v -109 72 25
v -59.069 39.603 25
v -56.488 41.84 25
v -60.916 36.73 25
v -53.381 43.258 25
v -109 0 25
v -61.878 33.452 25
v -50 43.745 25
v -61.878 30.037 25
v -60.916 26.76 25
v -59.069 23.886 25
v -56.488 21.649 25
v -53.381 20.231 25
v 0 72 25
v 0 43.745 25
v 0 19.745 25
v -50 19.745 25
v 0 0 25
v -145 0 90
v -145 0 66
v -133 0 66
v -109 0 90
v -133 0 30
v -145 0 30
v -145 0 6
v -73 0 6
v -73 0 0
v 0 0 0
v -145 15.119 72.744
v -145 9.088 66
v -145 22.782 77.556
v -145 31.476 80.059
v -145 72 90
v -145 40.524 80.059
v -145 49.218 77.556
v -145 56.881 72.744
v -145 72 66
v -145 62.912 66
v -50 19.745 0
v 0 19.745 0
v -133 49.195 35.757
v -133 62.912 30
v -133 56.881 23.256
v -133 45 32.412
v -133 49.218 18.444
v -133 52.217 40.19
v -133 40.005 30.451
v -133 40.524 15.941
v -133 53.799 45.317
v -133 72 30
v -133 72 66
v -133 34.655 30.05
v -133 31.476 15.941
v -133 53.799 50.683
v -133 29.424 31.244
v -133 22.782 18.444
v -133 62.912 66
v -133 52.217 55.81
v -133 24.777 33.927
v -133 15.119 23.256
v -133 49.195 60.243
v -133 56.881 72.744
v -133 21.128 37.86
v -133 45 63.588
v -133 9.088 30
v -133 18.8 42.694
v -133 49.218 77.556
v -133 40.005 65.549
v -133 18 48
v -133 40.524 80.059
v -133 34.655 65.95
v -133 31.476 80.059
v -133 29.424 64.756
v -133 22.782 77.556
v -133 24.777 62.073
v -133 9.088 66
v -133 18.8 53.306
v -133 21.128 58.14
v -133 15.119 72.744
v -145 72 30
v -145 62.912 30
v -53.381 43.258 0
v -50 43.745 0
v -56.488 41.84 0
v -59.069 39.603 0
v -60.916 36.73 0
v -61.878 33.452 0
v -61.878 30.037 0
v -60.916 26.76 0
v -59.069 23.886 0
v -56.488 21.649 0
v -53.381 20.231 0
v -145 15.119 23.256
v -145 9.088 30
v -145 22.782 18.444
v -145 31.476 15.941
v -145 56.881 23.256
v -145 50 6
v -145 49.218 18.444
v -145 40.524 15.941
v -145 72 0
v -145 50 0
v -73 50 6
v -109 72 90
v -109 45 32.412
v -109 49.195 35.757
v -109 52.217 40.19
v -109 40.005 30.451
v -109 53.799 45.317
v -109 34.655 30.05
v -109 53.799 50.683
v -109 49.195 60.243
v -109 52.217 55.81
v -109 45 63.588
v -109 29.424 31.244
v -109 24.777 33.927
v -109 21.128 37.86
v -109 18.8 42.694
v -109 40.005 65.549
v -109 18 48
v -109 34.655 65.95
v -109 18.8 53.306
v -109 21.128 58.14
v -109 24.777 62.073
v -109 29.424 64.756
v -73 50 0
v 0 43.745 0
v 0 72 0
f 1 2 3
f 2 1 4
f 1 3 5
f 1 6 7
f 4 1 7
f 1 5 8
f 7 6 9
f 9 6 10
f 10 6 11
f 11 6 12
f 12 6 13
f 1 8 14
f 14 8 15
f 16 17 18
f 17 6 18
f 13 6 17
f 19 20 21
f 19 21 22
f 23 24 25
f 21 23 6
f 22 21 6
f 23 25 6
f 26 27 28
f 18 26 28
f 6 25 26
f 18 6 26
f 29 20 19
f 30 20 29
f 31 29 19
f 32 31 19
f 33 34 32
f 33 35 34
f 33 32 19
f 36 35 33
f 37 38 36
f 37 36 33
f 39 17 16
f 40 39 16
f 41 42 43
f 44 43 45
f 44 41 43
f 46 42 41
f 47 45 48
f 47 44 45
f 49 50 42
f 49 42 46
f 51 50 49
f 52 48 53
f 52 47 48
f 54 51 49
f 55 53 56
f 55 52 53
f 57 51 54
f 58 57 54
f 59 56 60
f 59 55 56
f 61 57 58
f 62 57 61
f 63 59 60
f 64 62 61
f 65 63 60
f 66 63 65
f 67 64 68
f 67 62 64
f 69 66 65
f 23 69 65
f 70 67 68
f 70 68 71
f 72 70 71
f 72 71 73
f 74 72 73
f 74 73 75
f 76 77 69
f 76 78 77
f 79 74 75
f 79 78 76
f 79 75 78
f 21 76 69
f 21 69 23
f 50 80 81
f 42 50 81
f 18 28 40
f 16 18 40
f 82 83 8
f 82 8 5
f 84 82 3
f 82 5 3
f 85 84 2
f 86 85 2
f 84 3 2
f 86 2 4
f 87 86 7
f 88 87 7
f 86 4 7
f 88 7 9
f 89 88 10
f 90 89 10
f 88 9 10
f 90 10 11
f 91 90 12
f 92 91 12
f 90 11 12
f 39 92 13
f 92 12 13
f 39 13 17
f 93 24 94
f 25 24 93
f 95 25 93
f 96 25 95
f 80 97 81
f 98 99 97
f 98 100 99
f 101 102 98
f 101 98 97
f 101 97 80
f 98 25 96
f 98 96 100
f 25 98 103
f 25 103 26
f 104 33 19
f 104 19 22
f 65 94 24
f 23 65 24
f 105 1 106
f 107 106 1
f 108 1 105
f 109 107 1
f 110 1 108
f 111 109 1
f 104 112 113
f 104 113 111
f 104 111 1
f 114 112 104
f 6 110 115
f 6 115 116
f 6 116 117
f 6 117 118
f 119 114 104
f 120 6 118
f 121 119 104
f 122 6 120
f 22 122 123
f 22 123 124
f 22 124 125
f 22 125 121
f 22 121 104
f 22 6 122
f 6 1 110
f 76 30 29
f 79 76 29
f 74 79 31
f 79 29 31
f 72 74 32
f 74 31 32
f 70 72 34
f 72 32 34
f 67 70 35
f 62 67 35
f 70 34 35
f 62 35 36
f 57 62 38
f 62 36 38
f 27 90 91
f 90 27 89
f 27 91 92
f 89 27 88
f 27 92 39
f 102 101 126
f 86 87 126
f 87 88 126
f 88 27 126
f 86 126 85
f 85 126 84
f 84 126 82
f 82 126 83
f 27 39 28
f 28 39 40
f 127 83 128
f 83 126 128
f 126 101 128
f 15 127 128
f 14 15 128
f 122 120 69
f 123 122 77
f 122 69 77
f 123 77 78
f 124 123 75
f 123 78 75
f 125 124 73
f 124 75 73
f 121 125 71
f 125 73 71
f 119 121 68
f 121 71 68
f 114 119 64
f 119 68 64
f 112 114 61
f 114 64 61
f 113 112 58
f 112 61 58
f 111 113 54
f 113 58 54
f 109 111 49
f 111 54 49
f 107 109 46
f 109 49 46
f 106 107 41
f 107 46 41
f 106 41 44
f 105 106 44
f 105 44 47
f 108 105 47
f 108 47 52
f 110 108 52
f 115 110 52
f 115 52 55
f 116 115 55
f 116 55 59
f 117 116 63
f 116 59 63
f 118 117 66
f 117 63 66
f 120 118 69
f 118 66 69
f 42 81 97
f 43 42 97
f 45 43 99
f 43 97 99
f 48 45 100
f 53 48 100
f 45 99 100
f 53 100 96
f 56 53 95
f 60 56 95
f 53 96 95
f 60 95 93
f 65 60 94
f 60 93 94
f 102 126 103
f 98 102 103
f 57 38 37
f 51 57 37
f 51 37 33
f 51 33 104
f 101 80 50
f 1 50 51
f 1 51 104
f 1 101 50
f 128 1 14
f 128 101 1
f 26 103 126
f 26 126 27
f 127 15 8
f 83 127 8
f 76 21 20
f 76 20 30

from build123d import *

# Parameters (mm, degrees)
F0_W      = 145
F0_H      = 72
F1_DEPTH  = 90
F2_W      = 109
F2_H      = 65
F3_DEPTH  = 90
F5_DEPTH  = 25.4
F6_W      = 50
F6_H      = 6
F7_DEPTH  = 72
F9_DEPTH  = 12
F10_R     = 18
F11_DEPTH = 24


with BuildPart() as f1:
    # F0 (on Top) → F1 (new body)
    with BuildSketch(Plane.XY):
        with Locations((-72.5, 36)):
            Rectangle(F0_W, F0_H)
    extrude(amount=F1_DEPTH)

    # F2 (on face) → F3 (cut)
    with BuildSketch(Plane.XZ):
        with Locations((-54.5, 57.5)):
            Rectangle(F2_W, F2_H)
    extrude(amount=-F3_DEPTH, mode=Mode.SUBTRACT)

    # F4 (on face) → F5 (cut)
    with BuildSketch(Plane.XY.offset(25)):
        with BuildLine():
            Line((-50, 19.744541496), (0, 19.744541496))
            Line((0, 19.744541496), (0, 43.744541496))
            Line((0, 43.744541496), (-50, 43.744541496))
            ThreePointArc((-50, 43.744541496), (-62, 31.744541496), (-50, 19.744541496))
        make_face()
    extrude(amount=-F5_DEPTH, mode=Mode.SUBTRACT)

    # F6 (on face) → F7 (cut)
    with BuildSketch(Plane(origin=(-145, 0, 0), x_dir=(0, -1, 0), z_dir=(-1, 0, 0))):
        with Locations((-25, 3)):
            Rectangle(F6_W, F6_H)
    extrude(amount=-F7_DEPTH, mode=Mode.SUBTRACT)

    # F8 (on face) → F9 (cut)
    with BuildSketch(Plane(origin=(-145, 0, 0), x_dir=(0, -1, 0), z_dir=(-1, 0, 0))):
        with BuildLine():
            ThreePointArc((-62.9122615735, 30), (-68.3769952744, 48), (-62.9122615735, 66))
            Line((-62.9122615735, 66), (-72, 66))
            Line((-72, 66), (-72, 30))
            Line((-72, 30), (-62.9122615735, 30))
        make_face()
        with BuildLine():
            Line((-62.9122615735, 66), (-9.0877384265, 66))
            ThreePointArc((-9.0877384265, 66), (-36, 80.3769952744), (-62.9122615735, 66))
        make_face()
        with BuildLine():
            ThreePointArc((-9.0877384265, 66), (-5.0192964187, 57.4056274966), (-3.6230047256, 48))
            ThreePointArc((-3.6230047256, 48), (-5.0192964187, 38.5943725034), (-9.0877384265, 30))
            Line((-9.0877384265, 30), (0, 30))
            Line((0, 30), (0, 66))
            Line((0, 66), (-9.0877384265, 66))
        make_face()
        with BuildLine():
            ThreePointArc((-62.9122615735, 30), (-36, 15.6230047256), (-9.0877384265, 30))
            Line((-9.0877384265, 30), (-62.9122615735, 30))
        make_face()
        with BuildLine():
            ThreePointArc((-9.0877384265, 30), (-5.0192964187, 38.5943725034), (-3.6230047256, 48))
            ThreePointArc((-3.6230047256, 48), (-5.0192964187, 57.4056274966), (-9.0877384265, 66))
            Line((-9.0877384265, 66), (-62.9122615735, 66))
            ThreePointArc((-62.9122615735, 66), (-68.3769952744, 48), (-62.9122615735, 30))
            Line((-62.9122615735, 30), (-9.0877384265, 30))
        make_face()
    extrude(amount=-F9_DEPTH, mode=Mode.SUBTRACT)

    # F10 (on face) → F11 (cut, through all)
    with BuildSketch(Plane(origin=(-133, 0, 0), x_dir=(0, -1, 0), z_dir=(-1, 0, 0))):
        with Locations((-36, 48)):
            Circle(F10_R)
    extrude(amount=-F11_DEPTH, mode=Mode.SUBTRACT)


solid = f1.part
